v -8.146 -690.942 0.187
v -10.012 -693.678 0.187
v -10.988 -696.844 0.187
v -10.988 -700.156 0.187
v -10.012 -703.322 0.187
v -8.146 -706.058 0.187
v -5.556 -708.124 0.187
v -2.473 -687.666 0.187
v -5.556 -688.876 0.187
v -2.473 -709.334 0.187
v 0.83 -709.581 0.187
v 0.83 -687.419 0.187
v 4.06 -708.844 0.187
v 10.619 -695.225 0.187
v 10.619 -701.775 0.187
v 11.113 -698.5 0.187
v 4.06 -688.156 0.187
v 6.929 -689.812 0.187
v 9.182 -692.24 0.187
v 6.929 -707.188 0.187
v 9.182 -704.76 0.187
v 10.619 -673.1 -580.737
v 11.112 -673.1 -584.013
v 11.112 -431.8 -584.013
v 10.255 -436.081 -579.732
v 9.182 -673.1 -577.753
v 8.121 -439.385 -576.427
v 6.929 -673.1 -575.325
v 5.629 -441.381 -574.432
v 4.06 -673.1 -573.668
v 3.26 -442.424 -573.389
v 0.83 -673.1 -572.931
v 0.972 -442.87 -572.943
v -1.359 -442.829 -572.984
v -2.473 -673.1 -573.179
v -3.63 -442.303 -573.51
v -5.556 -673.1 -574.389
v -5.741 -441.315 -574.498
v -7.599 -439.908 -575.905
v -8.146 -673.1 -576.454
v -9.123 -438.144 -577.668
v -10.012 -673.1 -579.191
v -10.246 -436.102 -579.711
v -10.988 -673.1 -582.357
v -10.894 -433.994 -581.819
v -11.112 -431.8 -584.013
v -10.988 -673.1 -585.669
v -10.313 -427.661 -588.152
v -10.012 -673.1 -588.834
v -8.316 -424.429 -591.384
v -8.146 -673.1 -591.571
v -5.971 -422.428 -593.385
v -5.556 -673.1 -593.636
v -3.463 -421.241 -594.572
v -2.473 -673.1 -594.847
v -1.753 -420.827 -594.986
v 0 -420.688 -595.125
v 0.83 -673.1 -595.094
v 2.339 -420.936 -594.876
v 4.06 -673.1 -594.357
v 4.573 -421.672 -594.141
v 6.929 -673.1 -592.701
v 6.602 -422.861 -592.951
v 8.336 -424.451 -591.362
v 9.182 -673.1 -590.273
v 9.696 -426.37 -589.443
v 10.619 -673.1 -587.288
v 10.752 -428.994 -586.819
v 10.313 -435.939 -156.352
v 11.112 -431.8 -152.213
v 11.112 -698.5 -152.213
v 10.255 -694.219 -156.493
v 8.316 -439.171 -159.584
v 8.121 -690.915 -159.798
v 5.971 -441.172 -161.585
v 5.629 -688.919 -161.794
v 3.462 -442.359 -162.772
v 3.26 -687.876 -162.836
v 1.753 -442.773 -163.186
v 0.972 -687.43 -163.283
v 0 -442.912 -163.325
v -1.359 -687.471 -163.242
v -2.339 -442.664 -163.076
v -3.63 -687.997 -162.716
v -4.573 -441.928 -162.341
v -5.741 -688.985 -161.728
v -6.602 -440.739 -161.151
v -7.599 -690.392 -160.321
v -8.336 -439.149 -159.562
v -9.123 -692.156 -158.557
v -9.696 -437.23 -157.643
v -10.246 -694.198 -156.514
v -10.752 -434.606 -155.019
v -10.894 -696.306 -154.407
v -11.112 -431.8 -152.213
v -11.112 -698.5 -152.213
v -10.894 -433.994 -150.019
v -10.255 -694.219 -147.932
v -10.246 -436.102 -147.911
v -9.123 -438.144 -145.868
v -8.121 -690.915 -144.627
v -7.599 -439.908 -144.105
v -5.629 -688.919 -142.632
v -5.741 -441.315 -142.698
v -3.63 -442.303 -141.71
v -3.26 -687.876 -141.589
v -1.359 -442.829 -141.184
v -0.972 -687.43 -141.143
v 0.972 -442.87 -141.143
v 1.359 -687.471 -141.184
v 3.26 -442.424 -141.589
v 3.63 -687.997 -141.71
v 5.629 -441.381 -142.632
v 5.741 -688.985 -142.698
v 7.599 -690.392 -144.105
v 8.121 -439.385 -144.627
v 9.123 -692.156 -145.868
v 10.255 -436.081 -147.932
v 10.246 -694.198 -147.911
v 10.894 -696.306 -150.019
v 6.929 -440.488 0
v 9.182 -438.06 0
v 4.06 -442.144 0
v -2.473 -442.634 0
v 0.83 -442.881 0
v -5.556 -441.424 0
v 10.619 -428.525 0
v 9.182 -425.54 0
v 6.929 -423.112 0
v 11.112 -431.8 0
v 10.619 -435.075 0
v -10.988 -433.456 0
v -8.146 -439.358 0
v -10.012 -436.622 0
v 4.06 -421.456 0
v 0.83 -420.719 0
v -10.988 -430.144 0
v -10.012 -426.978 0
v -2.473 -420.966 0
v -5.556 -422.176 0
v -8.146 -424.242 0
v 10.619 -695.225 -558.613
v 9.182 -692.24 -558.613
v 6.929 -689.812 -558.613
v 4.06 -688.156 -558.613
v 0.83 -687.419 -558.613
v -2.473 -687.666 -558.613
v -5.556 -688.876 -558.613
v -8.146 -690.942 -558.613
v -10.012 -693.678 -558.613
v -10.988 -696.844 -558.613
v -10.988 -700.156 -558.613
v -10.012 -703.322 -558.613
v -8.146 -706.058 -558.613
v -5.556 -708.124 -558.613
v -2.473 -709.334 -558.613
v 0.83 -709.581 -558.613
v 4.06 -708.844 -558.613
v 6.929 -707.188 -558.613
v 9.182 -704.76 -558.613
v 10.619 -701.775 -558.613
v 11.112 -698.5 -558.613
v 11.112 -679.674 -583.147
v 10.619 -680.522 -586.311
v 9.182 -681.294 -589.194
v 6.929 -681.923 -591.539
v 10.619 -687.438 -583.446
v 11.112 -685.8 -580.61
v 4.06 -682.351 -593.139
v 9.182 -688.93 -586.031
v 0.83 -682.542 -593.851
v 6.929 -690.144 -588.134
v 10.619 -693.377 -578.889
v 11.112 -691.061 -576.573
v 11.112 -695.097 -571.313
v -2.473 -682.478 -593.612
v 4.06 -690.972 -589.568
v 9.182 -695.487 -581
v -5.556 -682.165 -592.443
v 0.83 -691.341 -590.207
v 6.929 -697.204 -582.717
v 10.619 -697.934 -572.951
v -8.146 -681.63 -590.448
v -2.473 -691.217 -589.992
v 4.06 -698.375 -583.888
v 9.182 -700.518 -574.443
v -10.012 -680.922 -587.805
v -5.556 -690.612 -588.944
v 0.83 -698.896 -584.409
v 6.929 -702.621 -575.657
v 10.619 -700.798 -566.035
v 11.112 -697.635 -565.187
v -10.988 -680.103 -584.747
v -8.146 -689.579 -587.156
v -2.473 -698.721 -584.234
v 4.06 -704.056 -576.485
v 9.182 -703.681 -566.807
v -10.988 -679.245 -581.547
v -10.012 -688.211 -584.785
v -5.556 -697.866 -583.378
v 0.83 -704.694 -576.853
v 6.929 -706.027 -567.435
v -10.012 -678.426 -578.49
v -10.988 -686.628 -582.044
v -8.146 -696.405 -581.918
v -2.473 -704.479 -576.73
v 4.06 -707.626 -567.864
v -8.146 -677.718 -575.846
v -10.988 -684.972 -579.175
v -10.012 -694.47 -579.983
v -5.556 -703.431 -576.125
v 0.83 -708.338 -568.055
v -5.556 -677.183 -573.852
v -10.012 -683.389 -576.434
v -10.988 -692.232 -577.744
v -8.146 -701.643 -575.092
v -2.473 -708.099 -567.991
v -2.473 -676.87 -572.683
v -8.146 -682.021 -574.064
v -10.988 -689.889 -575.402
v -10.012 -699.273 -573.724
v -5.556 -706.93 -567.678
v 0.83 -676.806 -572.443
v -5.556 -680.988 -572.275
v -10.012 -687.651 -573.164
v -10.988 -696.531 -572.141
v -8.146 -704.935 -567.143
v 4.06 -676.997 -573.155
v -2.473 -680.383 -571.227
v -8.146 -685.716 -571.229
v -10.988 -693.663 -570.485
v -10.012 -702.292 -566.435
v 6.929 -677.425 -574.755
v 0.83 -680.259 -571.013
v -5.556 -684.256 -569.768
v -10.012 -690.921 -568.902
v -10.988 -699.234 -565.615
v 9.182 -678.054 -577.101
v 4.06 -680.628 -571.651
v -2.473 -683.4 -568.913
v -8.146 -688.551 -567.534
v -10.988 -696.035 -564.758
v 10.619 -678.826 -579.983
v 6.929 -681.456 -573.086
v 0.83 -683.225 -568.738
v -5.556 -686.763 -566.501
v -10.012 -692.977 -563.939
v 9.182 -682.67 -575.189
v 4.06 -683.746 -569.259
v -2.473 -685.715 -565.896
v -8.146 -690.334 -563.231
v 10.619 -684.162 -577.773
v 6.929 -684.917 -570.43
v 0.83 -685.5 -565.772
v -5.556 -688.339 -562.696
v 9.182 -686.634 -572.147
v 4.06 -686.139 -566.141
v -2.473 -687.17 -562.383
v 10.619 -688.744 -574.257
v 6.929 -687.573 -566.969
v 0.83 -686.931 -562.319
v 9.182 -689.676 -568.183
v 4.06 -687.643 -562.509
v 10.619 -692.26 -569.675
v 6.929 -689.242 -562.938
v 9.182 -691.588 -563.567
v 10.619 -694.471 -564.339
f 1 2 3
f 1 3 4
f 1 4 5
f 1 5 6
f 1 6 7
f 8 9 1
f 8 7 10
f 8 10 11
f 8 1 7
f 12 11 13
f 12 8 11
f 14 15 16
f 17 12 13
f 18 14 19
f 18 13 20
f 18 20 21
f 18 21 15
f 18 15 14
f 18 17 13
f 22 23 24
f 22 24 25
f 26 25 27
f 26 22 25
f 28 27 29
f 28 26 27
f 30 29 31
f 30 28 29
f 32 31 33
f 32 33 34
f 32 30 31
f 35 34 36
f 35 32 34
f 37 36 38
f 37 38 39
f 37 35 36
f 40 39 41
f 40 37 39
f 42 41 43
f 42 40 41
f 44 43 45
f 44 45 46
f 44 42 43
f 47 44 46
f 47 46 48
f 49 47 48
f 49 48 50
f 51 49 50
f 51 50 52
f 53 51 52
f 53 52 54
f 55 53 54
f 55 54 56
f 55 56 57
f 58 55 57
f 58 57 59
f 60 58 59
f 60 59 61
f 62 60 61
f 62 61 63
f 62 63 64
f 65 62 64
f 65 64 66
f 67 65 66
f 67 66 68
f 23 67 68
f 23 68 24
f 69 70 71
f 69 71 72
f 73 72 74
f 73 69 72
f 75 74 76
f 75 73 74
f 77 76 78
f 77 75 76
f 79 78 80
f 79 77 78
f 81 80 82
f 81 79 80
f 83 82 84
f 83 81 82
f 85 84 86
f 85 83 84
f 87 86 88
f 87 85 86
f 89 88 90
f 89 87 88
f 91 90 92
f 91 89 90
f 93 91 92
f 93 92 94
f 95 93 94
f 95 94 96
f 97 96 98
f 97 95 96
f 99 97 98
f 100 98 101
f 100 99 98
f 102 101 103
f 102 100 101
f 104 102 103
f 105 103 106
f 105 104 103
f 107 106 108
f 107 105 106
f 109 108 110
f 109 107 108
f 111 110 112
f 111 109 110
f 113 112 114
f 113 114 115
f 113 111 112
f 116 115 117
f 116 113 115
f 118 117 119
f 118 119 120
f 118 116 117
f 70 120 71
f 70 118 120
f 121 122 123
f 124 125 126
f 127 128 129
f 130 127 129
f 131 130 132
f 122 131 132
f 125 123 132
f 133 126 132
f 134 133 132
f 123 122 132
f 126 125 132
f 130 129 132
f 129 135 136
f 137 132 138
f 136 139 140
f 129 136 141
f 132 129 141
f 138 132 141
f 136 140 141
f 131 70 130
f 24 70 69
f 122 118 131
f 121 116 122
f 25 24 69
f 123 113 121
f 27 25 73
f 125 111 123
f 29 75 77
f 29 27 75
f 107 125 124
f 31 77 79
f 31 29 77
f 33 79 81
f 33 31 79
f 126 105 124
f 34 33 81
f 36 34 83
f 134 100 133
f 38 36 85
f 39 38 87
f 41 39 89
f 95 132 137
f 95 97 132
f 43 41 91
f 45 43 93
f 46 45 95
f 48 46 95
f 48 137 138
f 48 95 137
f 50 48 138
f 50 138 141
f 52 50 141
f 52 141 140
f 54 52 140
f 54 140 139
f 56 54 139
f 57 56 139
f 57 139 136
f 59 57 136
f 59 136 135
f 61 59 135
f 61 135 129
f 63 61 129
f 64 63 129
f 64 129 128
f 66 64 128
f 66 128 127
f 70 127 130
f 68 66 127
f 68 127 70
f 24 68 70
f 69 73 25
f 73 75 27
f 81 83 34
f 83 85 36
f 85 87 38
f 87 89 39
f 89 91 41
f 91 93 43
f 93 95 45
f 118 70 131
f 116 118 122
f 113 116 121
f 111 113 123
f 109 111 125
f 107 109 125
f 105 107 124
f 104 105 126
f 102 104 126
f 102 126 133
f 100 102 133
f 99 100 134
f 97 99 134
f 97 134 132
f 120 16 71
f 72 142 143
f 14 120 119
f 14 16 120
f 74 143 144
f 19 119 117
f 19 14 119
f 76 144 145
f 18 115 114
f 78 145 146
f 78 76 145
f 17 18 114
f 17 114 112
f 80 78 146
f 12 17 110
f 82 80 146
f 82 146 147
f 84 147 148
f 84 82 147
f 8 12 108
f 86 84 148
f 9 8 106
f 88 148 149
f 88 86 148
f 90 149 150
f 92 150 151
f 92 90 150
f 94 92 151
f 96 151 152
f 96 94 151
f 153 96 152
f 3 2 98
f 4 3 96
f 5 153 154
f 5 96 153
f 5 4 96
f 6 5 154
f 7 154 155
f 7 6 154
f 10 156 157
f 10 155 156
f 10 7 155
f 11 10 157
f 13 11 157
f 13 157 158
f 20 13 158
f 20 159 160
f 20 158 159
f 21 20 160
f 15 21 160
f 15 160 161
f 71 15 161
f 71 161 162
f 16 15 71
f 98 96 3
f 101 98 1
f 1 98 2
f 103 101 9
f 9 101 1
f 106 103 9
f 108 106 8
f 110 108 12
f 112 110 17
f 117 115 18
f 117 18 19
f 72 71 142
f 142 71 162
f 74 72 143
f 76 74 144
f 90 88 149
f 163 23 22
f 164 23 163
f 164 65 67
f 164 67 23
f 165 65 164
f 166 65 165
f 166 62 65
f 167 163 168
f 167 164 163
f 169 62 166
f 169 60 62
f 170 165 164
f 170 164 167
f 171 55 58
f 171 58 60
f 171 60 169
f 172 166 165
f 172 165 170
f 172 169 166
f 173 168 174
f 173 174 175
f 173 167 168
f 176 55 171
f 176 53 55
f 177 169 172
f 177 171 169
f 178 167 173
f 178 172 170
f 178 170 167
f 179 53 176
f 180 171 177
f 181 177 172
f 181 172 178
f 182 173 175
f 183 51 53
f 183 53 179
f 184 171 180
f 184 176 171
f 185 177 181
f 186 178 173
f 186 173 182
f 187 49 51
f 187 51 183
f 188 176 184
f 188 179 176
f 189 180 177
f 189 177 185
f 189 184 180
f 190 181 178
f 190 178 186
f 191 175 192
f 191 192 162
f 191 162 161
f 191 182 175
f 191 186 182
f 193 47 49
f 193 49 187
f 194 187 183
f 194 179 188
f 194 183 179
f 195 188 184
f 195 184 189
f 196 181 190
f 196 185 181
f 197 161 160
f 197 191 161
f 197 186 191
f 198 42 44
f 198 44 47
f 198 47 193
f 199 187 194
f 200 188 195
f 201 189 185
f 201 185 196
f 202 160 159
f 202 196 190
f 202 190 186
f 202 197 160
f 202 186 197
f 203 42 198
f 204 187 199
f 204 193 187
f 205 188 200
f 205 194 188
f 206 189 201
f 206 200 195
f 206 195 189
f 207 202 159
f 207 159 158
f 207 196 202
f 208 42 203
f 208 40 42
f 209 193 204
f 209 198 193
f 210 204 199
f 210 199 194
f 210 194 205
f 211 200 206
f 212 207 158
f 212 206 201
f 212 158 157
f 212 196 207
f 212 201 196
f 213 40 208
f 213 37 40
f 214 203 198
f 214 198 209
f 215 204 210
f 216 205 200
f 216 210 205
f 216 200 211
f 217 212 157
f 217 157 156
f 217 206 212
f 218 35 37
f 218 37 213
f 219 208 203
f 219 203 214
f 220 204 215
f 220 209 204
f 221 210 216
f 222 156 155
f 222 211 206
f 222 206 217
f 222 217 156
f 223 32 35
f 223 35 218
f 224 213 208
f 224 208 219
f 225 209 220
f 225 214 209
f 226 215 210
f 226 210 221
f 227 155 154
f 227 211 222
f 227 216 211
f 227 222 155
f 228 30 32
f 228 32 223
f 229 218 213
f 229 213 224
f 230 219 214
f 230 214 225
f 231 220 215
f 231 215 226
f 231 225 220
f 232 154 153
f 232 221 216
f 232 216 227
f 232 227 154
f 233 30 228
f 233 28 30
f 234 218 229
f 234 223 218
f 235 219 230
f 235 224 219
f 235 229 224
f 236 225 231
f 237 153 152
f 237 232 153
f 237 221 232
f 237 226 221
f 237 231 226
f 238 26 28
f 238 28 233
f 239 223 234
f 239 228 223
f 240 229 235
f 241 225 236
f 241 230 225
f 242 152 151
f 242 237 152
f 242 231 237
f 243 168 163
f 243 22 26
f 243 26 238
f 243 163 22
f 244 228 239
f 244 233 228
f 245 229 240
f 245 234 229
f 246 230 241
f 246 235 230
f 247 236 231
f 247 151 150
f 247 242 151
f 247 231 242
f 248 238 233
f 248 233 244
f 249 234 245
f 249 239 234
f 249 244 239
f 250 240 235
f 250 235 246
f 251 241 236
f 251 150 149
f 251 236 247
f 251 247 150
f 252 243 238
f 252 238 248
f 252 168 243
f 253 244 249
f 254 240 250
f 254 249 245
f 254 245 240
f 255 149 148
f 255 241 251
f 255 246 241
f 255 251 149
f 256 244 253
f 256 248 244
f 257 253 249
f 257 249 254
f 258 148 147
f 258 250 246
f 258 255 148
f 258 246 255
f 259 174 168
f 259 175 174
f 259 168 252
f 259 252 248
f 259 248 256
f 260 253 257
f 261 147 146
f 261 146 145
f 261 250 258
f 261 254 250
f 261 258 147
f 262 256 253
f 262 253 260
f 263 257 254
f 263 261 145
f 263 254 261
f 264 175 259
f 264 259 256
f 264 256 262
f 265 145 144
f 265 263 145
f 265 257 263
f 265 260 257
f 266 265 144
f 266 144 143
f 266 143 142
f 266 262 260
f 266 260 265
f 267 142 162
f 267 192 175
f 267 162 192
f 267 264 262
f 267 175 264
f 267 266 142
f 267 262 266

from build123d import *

# Parameters (mm, degrees)
SKETCH3_R   = 11.1125
SKETCH3_8_R = 11.1125


with BuildPart() as part:
    # Sweep1: sweep along a path in Sketch1
    with BuildLine(Plane(origin=(0, 0, 0), x_dir=(0, 0, -1), z_dir=(1, 0, 0))) as sweep1_path:
        Line((0, -431.8), (152.212779539, -431.8))
        Line((152.212779539, -431.8), (584.012779539, -431.8))
        Line((584.012779539, -431.8), (584.012779539, -673.1))
        ThreePointArc((584.012779539, -673.1), (576.573291781, -691.060512242), (558.612779539, -698.5))
        Line((558.612779539, -698.5), (152.212779539, -698.5))
        Line((152.212779539, -698.5), (-0.187220461, -698.5))
    # Sketch3 → Sweep1 (sweep)
    with BuildSketch(Plane.XY):
        with Locations((0, -698.5)):
            Circle(SKETCH3_R)
    sweep(path=sweep1_path.line, transition=Transition.RIGHT)

    # Sweep2: sweep along a path in Sketch1<23>
    with BuildLine(Plane(origin=(0, 0, 0), x_dir=(0, 0, -1), z_dir=(1, 0, 0))) as sweep2_path:
        Line((-0.187220461, -698.5), (152.212779539, -698.5))
        Line((152.212779539, -698.5), (152.212779539, -431.8))
    # Sketch3<8> → Sweep2 (sweep)
    with BuildSketch(Plane.XY):
        with Locations((0, -698.5)):
            Circle(SKETCH3_8_R)
    sweep(path=sweep2_path.line, transition=Transition.RIGHT)


solid = part.part
